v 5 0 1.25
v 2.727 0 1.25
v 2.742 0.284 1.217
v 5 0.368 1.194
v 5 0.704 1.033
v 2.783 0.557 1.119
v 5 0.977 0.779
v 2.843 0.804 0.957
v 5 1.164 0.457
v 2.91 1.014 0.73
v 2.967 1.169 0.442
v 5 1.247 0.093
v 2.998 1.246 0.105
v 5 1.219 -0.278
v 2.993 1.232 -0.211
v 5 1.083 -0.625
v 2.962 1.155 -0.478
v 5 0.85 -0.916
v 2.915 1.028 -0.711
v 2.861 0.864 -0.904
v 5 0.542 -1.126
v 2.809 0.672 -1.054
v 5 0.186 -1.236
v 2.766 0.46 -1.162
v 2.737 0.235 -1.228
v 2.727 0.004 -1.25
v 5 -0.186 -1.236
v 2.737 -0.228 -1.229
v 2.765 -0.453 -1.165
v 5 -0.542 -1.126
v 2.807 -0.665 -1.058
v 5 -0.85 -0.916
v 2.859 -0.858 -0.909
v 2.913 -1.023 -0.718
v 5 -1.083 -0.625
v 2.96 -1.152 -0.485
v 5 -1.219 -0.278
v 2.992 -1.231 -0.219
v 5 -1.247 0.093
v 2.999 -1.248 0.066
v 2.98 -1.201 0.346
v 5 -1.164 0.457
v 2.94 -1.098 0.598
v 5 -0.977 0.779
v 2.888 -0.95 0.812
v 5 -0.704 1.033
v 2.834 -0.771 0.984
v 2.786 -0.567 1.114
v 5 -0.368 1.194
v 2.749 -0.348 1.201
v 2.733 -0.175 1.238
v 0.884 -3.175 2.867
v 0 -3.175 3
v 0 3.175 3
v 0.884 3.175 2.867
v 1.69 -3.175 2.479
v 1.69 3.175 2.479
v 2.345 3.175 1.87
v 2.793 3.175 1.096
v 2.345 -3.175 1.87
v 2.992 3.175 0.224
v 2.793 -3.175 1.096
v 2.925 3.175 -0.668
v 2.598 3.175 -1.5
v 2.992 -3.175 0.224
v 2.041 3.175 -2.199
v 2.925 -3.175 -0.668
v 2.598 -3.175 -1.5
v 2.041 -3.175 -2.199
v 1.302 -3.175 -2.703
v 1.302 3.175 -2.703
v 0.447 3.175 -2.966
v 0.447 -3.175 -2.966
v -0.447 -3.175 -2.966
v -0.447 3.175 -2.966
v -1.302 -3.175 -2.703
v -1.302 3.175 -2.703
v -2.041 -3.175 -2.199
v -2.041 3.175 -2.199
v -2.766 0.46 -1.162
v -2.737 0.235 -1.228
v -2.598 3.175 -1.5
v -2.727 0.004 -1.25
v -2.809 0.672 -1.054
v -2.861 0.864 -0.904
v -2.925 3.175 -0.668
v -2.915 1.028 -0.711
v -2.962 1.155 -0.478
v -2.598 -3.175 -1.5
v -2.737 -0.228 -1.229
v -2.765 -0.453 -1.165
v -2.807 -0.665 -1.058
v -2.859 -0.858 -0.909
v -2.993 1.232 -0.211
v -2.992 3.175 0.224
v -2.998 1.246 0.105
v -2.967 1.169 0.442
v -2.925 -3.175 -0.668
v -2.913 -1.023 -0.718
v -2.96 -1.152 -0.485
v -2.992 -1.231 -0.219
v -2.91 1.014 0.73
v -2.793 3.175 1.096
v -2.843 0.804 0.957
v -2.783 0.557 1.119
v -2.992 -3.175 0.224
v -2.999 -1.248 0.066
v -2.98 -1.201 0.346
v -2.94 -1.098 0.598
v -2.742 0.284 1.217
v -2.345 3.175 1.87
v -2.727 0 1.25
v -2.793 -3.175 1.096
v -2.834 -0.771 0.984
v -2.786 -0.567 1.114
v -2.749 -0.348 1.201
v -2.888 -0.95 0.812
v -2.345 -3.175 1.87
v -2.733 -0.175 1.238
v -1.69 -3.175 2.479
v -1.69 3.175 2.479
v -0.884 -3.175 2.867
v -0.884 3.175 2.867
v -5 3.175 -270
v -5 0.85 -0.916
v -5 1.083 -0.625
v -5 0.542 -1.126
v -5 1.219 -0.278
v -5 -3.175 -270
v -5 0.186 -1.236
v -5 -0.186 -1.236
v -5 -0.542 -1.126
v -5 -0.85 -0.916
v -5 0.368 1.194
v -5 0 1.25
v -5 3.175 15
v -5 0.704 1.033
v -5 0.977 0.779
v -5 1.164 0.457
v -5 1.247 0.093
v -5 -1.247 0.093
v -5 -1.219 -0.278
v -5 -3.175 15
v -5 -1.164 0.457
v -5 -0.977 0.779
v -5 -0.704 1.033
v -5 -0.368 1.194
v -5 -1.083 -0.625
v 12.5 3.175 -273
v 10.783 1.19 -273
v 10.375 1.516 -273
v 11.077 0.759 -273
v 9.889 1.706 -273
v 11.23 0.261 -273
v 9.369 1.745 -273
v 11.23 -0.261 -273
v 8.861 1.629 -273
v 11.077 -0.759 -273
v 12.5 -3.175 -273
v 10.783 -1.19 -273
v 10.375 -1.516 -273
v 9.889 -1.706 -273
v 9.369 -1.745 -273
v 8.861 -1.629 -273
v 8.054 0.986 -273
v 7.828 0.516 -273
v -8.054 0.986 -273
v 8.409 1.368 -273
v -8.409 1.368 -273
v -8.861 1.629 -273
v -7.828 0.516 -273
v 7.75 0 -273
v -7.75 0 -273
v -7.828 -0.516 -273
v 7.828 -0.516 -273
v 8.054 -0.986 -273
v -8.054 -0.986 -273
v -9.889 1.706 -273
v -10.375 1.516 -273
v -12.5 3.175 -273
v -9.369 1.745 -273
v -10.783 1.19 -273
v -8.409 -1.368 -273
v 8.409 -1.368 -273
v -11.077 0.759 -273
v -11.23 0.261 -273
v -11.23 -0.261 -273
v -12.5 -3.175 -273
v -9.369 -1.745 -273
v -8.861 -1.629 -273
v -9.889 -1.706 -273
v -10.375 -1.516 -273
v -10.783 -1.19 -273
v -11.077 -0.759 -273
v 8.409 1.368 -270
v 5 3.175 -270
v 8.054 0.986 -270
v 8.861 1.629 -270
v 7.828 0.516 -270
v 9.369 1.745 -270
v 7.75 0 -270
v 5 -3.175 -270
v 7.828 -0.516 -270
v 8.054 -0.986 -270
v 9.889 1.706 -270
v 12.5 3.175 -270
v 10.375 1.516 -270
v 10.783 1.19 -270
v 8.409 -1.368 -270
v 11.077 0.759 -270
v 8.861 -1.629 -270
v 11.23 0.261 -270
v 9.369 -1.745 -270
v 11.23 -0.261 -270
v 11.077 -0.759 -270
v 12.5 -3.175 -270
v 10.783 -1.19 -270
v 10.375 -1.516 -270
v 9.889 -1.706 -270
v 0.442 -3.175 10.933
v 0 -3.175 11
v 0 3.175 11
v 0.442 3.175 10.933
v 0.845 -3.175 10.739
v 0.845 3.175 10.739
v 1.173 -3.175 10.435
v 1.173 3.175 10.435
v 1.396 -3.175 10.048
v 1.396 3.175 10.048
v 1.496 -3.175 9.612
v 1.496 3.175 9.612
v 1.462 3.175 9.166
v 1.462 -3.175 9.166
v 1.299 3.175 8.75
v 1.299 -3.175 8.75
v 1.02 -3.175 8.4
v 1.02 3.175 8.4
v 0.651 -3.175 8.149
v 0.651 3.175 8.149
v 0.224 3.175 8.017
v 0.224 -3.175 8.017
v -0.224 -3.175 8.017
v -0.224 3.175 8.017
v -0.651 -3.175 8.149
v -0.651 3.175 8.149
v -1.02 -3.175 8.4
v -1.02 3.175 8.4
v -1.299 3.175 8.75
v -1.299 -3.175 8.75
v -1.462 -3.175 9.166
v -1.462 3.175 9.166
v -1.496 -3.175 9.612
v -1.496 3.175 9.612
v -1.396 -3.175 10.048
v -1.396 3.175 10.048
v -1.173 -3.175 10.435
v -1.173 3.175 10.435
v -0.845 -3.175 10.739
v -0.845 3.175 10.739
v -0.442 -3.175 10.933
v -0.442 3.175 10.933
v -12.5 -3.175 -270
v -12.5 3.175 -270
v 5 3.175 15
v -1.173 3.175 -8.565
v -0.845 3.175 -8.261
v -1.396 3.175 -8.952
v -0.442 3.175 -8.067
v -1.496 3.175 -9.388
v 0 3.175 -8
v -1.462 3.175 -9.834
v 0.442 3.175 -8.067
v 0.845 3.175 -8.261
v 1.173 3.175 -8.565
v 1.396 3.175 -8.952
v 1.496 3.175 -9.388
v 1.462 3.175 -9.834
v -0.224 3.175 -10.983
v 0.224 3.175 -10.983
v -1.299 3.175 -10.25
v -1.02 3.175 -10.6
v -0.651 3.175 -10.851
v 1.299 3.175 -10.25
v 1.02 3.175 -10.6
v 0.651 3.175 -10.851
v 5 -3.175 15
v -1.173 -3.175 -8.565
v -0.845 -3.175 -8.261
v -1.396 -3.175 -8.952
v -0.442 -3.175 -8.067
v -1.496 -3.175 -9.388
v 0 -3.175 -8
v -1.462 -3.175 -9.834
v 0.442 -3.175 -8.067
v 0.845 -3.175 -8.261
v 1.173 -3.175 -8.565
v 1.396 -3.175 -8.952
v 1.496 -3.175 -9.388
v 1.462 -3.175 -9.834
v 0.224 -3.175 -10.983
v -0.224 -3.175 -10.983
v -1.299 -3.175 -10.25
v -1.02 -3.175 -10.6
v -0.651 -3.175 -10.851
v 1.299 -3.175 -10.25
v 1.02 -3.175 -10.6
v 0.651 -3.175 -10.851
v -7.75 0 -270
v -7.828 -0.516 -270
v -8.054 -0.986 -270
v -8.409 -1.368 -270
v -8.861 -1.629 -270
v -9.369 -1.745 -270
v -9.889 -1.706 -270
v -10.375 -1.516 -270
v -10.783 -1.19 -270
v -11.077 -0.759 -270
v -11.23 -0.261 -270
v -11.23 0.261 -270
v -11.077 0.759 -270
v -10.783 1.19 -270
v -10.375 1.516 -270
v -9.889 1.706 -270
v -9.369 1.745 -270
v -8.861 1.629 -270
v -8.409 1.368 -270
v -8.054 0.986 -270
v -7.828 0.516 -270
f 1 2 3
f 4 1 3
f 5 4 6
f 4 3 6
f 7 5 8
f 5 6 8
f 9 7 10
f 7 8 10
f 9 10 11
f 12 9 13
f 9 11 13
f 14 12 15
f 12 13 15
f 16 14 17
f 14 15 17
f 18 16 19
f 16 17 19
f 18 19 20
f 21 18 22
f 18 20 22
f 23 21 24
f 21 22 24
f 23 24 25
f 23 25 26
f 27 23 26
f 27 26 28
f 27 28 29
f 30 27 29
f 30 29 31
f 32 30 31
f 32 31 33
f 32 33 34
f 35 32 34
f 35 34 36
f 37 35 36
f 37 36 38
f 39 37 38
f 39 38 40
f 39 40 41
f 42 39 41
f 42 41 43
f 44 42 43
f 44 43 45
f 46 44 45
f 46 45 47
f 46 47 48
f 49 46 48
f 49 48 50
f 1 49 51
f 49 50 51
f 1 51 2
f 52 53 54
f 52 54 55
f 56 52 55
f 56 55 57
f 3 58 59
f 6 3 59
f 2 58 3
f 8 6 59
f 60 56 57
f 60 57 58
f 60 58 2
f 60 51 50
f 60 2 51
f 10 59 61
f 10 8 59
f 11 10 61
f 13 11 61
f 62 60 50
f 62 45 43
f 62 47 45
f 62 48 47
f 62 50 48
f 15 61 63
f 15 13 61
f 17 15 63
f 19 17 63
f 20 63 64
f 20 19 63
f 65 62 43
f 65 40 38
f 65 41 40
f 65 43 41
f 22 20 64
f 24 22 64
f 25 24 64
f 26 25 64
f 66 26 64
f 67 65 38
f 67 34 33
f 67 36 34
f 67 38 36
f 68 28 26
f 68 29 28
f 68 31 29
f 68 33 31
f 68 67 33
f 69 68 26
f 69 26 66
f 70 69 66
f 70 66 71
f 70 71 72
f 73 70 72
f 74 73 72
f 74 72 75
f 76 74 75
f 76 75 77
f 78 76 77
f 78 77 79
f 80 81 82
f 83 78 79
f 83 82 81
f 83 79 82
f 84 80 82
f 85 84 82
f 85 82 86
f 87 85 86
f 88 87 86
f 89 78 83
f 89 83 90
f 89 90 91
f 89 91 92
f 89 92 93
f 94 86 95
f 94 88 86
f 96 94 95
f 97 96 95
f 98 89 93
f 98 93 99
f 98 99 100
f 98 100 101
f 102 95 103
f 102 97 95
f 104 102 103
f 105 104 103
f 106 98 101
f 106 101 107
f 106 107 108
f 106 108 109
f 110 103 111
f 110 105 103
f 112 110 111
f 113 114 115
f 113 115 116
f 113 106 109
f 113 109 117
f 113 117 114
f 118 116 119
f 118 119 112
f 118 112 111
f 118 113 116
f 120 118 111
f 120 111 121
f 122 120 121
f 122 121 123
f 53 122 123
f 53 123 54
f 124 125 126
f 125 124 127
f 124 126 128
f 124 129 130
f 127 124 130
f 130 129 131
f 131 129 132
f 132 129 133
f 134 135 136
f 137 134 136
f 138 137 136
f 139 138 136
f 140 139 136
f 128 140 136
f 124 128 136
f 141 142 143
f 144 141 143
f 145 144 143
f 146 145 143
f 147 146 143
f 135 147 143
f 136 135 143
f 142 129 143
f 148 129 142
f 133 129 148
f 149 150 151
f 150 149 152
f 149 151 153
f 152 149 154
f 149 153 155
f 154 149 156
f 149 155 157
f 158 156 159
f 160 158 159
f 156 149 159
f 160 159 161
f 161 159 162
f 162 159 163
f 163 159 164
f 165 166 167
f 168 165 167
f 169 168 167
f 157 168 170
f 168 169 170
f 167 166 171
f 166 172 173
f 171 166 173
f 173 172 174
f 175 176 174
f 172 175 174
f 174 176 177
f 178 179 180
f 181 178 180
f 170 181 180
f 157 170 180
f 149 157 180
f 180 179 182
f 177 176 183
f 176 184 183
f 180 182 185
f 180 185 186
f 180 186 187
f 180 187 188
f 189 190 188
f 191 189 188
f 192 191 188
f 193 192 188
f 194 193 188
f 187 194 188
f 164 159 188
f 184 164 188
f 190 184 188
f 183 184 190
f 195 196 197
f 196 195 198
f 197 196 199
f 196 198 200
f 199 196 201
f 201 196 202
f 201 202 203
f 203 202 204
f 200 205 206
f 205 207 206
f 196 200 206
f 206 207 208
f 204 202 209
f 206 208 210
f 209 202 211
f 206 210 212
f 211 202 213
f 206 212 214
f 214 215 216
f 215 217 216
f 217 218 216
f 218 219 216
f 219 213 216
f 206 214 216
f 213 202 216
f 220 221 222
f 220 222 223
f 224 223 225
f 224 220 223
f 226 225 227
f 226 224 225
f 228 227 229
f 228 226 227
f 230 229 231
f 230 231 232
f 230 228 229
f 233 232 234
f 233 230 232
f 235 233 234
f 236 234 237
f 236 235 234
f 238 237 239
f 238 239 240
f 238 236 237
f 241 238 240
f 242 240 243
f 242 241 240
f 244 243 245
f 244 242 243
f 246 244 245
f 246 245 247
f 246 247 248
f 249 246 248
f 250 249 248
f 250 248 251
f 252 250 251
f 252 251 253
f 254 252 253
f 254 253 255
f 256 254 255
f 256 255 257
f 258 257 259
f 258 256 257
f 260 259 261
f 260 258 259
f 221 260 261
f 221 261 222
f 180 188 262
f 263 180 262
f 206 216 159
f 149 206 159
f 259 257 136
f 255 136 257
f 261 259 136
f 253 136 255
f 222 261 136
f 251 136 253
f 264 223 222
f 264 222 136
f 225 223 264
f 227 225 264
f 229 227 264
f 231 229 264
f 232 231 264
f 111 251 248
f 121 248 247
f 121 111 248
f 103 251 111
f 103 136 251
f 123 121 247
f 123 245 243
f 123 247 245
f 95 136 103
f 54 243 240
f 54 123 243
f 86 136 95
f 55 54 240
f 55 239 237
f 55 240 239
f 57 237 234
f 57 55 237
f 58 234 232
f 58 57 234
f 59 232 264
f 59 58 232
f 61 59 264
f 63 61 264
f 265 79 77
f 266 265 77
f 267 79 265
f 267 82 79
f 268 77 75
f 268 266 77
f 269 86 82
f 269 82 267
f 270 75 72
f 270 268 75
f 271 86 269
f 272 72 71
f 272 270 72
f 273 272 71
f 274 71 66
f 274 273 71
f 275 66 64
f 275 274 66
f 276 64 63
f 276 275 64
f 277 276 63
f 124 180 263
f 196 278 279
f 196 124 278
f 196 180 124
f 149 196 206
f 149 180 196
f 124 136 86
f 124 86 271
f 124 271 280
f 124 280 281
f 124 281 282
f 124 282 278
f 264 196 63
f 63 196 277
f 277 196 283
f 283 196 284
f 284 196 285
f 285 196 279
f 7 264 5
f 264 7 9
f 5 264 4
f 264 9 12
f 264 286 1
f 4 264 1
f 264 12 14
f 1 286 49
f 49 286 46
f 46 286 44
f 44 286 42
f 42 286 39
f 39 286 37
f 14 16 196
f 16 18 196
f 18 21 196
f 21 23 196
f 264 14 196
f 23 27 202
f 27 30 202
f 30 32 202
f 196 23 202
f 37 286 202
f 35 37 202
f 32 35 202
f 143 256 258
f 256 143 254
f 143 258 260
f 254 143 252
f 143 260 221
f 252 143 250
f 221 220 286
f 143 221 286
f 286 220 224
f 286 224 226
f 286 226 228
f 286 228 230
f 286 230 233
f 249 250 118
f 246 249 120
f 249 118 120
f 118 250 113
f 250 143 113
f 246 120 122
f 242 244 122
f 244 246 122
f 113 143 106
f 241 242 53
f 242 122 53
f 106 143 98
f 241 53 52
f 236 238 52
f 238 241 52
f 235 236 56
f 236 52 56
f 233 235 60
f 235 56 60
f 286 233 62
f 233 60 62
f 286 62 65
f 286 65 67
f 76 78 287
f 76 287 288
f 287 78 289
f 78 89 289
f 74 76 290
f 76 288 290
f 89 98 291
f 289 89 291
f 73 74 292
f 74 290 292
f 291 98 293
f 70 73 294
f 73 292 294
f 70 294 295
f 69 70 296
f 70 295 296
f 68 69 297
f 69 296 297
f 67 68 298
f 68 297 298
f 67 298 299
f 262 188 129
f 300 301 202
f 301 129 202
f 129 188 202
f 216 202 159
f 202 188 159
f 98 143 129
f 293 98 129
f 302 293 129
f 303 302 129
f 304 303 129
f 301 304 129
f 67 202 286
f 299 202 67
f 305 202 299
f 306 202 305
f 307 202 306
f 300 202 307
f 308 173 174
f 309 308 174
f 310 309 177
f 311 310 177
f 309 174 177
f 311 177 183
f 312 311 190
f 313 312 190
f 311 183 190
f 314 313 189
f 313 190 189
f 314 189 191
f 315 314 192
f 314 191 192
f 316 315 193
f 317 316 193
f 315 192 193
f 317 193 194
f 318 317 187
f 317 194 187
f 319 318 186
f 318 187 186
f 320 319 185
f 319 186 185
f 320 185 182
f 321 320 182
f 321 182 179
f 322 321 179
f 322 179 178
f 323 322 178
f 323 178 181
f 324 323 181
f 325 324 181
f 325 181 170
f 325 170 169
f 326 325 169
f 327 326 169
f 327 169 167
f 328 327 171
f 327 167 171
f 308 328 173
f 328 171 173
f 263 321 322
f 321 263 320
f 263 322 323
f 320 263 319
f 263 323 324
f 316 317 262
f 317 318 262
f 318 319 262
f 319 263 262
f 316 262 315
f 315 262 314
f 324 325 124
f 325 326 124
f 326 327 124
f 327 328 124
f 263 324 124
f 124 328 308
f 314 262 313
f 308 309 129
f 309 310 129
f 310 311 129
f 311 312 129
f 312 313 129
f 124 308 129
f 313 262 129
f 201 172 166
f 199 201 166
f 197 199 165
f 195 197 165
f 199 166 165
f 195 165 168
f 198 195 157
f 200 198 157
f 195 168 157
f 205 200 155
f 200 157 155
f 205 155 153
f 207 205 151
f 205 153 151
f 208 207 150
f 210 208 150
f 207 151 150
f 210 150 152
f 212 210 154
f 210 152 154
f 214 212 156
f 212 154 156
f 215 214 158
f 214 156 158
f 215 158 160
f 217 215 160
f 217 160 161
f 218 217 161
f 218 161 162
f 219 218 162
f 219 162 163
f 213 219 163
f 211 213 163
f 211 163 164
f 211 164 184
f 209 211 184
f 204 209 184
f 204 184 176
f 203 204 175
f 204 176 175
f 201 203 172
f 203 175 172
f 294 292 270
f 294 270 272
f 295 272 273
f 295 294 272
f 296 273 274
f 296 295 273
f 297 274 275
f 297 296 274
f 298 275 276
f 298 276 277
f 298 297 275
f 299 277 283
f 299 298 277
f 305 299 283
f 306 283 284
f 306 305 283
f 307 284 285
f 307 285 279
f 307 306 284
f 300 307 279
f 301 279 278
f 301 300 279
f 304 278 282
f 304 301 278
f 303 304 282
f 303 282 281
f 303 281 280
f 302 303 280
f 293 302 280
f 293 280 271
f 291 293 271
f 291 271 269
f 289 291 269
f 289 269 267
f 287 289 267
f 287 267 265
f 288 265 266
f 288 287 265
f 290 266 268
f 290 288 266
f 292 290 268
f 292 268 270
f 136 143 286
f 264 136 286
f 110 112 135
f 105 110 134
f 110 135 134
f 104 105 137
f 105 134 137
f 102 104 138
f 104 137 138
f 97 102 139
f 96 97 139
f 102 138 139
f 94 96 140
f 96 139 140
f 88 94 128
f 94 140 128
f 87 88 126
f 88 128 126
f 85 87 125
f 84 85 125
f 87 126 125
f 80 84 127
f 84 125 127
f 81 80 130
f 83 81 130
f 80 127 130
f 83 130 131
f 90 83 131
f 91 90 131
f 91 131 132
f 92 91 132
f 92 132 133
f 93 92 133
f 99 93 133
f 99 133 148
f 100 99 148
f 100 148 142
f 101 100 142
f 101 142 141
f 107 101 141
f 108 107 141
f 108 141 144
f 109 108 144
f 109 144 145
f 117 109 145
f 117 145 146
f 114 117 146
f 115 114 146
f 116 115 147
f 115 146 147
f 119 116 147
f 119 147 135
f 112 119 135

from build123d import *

# Parameters (mm, degrees)
BOSS_EXTRUDE1_DEPTH         = 3.175
BOSS_EXTRUDE1_DEPTH_BACK    = 3.175
SKETCH1_R                   = 1.5
SKETCH1_R_2                 = 3
SKETCH2_R                   = 1.75
CUT_EXTRUDE1_DEPTH          = 3
TAP_DRILL_FOR_M3X0_5_TAP1_D = 2.5


with BuildPart() as part:
    # Sketch1 → Boss-Extrude1 (new, two sides: drawn at the far end of the back side and taken through both)
    with BuildSketch(Plane(origin=(0, 0, 0), x_dir=(1, 0, 0), z_dir=(0, 1, 0)).offset(-BOSS_EXTRUDE1_DEPTH_BACK)):
        Polygon((-5, 270), (-5, -15), (5, -15), (5, 270), (12.5, 270), (12.5, 273), (-12.5, 273), (-12.5, 270), align=None)
        with Locations((0, -9.5)):
            Circle(SKETCH1_R, mode=Mode.SUBTRACT)
        with Locations((0, 9.5)):
            Circle(SKETCH1_R, mode=Mode.SUBTRACT)
        Circle(SKETCH1_R_2, mode=Mode.SUBTRACT)
    extrude(amount=BOSS_EXTRUDE1_DEPTH + BOSS_EXTRUDE1_DEPTH_BACK)

    # Sketch2 → Cut-Extrude1 (cut)
    with BuildSketch(Plane(origin=(0, 0, -273), x_dir=(-1, 0, 0), z_dir=(0, 0, -1))):
        with Locations((-9.5, 0)):
            Circle(SKETCH2_R)
        with Locations((9.5, 0)):
            Circle(SKETCH2_R)
    extrude(amount=-CUT_EXTRUDE1_DEPTH, mode=Mode.SUBTRACT)

    # Tap Drill for M3x0.5 Tap1 (through all)
    with Locations(Plane(origin=(5, 0, 0), x_dir=(0, 0, -1), z_dir=(1, 0, 0))):
        with Locations((0, 0)):
            Hole(TAP_DRILL_FOR_M3X0_5_TAP1_D / 2)


solid = part.part
